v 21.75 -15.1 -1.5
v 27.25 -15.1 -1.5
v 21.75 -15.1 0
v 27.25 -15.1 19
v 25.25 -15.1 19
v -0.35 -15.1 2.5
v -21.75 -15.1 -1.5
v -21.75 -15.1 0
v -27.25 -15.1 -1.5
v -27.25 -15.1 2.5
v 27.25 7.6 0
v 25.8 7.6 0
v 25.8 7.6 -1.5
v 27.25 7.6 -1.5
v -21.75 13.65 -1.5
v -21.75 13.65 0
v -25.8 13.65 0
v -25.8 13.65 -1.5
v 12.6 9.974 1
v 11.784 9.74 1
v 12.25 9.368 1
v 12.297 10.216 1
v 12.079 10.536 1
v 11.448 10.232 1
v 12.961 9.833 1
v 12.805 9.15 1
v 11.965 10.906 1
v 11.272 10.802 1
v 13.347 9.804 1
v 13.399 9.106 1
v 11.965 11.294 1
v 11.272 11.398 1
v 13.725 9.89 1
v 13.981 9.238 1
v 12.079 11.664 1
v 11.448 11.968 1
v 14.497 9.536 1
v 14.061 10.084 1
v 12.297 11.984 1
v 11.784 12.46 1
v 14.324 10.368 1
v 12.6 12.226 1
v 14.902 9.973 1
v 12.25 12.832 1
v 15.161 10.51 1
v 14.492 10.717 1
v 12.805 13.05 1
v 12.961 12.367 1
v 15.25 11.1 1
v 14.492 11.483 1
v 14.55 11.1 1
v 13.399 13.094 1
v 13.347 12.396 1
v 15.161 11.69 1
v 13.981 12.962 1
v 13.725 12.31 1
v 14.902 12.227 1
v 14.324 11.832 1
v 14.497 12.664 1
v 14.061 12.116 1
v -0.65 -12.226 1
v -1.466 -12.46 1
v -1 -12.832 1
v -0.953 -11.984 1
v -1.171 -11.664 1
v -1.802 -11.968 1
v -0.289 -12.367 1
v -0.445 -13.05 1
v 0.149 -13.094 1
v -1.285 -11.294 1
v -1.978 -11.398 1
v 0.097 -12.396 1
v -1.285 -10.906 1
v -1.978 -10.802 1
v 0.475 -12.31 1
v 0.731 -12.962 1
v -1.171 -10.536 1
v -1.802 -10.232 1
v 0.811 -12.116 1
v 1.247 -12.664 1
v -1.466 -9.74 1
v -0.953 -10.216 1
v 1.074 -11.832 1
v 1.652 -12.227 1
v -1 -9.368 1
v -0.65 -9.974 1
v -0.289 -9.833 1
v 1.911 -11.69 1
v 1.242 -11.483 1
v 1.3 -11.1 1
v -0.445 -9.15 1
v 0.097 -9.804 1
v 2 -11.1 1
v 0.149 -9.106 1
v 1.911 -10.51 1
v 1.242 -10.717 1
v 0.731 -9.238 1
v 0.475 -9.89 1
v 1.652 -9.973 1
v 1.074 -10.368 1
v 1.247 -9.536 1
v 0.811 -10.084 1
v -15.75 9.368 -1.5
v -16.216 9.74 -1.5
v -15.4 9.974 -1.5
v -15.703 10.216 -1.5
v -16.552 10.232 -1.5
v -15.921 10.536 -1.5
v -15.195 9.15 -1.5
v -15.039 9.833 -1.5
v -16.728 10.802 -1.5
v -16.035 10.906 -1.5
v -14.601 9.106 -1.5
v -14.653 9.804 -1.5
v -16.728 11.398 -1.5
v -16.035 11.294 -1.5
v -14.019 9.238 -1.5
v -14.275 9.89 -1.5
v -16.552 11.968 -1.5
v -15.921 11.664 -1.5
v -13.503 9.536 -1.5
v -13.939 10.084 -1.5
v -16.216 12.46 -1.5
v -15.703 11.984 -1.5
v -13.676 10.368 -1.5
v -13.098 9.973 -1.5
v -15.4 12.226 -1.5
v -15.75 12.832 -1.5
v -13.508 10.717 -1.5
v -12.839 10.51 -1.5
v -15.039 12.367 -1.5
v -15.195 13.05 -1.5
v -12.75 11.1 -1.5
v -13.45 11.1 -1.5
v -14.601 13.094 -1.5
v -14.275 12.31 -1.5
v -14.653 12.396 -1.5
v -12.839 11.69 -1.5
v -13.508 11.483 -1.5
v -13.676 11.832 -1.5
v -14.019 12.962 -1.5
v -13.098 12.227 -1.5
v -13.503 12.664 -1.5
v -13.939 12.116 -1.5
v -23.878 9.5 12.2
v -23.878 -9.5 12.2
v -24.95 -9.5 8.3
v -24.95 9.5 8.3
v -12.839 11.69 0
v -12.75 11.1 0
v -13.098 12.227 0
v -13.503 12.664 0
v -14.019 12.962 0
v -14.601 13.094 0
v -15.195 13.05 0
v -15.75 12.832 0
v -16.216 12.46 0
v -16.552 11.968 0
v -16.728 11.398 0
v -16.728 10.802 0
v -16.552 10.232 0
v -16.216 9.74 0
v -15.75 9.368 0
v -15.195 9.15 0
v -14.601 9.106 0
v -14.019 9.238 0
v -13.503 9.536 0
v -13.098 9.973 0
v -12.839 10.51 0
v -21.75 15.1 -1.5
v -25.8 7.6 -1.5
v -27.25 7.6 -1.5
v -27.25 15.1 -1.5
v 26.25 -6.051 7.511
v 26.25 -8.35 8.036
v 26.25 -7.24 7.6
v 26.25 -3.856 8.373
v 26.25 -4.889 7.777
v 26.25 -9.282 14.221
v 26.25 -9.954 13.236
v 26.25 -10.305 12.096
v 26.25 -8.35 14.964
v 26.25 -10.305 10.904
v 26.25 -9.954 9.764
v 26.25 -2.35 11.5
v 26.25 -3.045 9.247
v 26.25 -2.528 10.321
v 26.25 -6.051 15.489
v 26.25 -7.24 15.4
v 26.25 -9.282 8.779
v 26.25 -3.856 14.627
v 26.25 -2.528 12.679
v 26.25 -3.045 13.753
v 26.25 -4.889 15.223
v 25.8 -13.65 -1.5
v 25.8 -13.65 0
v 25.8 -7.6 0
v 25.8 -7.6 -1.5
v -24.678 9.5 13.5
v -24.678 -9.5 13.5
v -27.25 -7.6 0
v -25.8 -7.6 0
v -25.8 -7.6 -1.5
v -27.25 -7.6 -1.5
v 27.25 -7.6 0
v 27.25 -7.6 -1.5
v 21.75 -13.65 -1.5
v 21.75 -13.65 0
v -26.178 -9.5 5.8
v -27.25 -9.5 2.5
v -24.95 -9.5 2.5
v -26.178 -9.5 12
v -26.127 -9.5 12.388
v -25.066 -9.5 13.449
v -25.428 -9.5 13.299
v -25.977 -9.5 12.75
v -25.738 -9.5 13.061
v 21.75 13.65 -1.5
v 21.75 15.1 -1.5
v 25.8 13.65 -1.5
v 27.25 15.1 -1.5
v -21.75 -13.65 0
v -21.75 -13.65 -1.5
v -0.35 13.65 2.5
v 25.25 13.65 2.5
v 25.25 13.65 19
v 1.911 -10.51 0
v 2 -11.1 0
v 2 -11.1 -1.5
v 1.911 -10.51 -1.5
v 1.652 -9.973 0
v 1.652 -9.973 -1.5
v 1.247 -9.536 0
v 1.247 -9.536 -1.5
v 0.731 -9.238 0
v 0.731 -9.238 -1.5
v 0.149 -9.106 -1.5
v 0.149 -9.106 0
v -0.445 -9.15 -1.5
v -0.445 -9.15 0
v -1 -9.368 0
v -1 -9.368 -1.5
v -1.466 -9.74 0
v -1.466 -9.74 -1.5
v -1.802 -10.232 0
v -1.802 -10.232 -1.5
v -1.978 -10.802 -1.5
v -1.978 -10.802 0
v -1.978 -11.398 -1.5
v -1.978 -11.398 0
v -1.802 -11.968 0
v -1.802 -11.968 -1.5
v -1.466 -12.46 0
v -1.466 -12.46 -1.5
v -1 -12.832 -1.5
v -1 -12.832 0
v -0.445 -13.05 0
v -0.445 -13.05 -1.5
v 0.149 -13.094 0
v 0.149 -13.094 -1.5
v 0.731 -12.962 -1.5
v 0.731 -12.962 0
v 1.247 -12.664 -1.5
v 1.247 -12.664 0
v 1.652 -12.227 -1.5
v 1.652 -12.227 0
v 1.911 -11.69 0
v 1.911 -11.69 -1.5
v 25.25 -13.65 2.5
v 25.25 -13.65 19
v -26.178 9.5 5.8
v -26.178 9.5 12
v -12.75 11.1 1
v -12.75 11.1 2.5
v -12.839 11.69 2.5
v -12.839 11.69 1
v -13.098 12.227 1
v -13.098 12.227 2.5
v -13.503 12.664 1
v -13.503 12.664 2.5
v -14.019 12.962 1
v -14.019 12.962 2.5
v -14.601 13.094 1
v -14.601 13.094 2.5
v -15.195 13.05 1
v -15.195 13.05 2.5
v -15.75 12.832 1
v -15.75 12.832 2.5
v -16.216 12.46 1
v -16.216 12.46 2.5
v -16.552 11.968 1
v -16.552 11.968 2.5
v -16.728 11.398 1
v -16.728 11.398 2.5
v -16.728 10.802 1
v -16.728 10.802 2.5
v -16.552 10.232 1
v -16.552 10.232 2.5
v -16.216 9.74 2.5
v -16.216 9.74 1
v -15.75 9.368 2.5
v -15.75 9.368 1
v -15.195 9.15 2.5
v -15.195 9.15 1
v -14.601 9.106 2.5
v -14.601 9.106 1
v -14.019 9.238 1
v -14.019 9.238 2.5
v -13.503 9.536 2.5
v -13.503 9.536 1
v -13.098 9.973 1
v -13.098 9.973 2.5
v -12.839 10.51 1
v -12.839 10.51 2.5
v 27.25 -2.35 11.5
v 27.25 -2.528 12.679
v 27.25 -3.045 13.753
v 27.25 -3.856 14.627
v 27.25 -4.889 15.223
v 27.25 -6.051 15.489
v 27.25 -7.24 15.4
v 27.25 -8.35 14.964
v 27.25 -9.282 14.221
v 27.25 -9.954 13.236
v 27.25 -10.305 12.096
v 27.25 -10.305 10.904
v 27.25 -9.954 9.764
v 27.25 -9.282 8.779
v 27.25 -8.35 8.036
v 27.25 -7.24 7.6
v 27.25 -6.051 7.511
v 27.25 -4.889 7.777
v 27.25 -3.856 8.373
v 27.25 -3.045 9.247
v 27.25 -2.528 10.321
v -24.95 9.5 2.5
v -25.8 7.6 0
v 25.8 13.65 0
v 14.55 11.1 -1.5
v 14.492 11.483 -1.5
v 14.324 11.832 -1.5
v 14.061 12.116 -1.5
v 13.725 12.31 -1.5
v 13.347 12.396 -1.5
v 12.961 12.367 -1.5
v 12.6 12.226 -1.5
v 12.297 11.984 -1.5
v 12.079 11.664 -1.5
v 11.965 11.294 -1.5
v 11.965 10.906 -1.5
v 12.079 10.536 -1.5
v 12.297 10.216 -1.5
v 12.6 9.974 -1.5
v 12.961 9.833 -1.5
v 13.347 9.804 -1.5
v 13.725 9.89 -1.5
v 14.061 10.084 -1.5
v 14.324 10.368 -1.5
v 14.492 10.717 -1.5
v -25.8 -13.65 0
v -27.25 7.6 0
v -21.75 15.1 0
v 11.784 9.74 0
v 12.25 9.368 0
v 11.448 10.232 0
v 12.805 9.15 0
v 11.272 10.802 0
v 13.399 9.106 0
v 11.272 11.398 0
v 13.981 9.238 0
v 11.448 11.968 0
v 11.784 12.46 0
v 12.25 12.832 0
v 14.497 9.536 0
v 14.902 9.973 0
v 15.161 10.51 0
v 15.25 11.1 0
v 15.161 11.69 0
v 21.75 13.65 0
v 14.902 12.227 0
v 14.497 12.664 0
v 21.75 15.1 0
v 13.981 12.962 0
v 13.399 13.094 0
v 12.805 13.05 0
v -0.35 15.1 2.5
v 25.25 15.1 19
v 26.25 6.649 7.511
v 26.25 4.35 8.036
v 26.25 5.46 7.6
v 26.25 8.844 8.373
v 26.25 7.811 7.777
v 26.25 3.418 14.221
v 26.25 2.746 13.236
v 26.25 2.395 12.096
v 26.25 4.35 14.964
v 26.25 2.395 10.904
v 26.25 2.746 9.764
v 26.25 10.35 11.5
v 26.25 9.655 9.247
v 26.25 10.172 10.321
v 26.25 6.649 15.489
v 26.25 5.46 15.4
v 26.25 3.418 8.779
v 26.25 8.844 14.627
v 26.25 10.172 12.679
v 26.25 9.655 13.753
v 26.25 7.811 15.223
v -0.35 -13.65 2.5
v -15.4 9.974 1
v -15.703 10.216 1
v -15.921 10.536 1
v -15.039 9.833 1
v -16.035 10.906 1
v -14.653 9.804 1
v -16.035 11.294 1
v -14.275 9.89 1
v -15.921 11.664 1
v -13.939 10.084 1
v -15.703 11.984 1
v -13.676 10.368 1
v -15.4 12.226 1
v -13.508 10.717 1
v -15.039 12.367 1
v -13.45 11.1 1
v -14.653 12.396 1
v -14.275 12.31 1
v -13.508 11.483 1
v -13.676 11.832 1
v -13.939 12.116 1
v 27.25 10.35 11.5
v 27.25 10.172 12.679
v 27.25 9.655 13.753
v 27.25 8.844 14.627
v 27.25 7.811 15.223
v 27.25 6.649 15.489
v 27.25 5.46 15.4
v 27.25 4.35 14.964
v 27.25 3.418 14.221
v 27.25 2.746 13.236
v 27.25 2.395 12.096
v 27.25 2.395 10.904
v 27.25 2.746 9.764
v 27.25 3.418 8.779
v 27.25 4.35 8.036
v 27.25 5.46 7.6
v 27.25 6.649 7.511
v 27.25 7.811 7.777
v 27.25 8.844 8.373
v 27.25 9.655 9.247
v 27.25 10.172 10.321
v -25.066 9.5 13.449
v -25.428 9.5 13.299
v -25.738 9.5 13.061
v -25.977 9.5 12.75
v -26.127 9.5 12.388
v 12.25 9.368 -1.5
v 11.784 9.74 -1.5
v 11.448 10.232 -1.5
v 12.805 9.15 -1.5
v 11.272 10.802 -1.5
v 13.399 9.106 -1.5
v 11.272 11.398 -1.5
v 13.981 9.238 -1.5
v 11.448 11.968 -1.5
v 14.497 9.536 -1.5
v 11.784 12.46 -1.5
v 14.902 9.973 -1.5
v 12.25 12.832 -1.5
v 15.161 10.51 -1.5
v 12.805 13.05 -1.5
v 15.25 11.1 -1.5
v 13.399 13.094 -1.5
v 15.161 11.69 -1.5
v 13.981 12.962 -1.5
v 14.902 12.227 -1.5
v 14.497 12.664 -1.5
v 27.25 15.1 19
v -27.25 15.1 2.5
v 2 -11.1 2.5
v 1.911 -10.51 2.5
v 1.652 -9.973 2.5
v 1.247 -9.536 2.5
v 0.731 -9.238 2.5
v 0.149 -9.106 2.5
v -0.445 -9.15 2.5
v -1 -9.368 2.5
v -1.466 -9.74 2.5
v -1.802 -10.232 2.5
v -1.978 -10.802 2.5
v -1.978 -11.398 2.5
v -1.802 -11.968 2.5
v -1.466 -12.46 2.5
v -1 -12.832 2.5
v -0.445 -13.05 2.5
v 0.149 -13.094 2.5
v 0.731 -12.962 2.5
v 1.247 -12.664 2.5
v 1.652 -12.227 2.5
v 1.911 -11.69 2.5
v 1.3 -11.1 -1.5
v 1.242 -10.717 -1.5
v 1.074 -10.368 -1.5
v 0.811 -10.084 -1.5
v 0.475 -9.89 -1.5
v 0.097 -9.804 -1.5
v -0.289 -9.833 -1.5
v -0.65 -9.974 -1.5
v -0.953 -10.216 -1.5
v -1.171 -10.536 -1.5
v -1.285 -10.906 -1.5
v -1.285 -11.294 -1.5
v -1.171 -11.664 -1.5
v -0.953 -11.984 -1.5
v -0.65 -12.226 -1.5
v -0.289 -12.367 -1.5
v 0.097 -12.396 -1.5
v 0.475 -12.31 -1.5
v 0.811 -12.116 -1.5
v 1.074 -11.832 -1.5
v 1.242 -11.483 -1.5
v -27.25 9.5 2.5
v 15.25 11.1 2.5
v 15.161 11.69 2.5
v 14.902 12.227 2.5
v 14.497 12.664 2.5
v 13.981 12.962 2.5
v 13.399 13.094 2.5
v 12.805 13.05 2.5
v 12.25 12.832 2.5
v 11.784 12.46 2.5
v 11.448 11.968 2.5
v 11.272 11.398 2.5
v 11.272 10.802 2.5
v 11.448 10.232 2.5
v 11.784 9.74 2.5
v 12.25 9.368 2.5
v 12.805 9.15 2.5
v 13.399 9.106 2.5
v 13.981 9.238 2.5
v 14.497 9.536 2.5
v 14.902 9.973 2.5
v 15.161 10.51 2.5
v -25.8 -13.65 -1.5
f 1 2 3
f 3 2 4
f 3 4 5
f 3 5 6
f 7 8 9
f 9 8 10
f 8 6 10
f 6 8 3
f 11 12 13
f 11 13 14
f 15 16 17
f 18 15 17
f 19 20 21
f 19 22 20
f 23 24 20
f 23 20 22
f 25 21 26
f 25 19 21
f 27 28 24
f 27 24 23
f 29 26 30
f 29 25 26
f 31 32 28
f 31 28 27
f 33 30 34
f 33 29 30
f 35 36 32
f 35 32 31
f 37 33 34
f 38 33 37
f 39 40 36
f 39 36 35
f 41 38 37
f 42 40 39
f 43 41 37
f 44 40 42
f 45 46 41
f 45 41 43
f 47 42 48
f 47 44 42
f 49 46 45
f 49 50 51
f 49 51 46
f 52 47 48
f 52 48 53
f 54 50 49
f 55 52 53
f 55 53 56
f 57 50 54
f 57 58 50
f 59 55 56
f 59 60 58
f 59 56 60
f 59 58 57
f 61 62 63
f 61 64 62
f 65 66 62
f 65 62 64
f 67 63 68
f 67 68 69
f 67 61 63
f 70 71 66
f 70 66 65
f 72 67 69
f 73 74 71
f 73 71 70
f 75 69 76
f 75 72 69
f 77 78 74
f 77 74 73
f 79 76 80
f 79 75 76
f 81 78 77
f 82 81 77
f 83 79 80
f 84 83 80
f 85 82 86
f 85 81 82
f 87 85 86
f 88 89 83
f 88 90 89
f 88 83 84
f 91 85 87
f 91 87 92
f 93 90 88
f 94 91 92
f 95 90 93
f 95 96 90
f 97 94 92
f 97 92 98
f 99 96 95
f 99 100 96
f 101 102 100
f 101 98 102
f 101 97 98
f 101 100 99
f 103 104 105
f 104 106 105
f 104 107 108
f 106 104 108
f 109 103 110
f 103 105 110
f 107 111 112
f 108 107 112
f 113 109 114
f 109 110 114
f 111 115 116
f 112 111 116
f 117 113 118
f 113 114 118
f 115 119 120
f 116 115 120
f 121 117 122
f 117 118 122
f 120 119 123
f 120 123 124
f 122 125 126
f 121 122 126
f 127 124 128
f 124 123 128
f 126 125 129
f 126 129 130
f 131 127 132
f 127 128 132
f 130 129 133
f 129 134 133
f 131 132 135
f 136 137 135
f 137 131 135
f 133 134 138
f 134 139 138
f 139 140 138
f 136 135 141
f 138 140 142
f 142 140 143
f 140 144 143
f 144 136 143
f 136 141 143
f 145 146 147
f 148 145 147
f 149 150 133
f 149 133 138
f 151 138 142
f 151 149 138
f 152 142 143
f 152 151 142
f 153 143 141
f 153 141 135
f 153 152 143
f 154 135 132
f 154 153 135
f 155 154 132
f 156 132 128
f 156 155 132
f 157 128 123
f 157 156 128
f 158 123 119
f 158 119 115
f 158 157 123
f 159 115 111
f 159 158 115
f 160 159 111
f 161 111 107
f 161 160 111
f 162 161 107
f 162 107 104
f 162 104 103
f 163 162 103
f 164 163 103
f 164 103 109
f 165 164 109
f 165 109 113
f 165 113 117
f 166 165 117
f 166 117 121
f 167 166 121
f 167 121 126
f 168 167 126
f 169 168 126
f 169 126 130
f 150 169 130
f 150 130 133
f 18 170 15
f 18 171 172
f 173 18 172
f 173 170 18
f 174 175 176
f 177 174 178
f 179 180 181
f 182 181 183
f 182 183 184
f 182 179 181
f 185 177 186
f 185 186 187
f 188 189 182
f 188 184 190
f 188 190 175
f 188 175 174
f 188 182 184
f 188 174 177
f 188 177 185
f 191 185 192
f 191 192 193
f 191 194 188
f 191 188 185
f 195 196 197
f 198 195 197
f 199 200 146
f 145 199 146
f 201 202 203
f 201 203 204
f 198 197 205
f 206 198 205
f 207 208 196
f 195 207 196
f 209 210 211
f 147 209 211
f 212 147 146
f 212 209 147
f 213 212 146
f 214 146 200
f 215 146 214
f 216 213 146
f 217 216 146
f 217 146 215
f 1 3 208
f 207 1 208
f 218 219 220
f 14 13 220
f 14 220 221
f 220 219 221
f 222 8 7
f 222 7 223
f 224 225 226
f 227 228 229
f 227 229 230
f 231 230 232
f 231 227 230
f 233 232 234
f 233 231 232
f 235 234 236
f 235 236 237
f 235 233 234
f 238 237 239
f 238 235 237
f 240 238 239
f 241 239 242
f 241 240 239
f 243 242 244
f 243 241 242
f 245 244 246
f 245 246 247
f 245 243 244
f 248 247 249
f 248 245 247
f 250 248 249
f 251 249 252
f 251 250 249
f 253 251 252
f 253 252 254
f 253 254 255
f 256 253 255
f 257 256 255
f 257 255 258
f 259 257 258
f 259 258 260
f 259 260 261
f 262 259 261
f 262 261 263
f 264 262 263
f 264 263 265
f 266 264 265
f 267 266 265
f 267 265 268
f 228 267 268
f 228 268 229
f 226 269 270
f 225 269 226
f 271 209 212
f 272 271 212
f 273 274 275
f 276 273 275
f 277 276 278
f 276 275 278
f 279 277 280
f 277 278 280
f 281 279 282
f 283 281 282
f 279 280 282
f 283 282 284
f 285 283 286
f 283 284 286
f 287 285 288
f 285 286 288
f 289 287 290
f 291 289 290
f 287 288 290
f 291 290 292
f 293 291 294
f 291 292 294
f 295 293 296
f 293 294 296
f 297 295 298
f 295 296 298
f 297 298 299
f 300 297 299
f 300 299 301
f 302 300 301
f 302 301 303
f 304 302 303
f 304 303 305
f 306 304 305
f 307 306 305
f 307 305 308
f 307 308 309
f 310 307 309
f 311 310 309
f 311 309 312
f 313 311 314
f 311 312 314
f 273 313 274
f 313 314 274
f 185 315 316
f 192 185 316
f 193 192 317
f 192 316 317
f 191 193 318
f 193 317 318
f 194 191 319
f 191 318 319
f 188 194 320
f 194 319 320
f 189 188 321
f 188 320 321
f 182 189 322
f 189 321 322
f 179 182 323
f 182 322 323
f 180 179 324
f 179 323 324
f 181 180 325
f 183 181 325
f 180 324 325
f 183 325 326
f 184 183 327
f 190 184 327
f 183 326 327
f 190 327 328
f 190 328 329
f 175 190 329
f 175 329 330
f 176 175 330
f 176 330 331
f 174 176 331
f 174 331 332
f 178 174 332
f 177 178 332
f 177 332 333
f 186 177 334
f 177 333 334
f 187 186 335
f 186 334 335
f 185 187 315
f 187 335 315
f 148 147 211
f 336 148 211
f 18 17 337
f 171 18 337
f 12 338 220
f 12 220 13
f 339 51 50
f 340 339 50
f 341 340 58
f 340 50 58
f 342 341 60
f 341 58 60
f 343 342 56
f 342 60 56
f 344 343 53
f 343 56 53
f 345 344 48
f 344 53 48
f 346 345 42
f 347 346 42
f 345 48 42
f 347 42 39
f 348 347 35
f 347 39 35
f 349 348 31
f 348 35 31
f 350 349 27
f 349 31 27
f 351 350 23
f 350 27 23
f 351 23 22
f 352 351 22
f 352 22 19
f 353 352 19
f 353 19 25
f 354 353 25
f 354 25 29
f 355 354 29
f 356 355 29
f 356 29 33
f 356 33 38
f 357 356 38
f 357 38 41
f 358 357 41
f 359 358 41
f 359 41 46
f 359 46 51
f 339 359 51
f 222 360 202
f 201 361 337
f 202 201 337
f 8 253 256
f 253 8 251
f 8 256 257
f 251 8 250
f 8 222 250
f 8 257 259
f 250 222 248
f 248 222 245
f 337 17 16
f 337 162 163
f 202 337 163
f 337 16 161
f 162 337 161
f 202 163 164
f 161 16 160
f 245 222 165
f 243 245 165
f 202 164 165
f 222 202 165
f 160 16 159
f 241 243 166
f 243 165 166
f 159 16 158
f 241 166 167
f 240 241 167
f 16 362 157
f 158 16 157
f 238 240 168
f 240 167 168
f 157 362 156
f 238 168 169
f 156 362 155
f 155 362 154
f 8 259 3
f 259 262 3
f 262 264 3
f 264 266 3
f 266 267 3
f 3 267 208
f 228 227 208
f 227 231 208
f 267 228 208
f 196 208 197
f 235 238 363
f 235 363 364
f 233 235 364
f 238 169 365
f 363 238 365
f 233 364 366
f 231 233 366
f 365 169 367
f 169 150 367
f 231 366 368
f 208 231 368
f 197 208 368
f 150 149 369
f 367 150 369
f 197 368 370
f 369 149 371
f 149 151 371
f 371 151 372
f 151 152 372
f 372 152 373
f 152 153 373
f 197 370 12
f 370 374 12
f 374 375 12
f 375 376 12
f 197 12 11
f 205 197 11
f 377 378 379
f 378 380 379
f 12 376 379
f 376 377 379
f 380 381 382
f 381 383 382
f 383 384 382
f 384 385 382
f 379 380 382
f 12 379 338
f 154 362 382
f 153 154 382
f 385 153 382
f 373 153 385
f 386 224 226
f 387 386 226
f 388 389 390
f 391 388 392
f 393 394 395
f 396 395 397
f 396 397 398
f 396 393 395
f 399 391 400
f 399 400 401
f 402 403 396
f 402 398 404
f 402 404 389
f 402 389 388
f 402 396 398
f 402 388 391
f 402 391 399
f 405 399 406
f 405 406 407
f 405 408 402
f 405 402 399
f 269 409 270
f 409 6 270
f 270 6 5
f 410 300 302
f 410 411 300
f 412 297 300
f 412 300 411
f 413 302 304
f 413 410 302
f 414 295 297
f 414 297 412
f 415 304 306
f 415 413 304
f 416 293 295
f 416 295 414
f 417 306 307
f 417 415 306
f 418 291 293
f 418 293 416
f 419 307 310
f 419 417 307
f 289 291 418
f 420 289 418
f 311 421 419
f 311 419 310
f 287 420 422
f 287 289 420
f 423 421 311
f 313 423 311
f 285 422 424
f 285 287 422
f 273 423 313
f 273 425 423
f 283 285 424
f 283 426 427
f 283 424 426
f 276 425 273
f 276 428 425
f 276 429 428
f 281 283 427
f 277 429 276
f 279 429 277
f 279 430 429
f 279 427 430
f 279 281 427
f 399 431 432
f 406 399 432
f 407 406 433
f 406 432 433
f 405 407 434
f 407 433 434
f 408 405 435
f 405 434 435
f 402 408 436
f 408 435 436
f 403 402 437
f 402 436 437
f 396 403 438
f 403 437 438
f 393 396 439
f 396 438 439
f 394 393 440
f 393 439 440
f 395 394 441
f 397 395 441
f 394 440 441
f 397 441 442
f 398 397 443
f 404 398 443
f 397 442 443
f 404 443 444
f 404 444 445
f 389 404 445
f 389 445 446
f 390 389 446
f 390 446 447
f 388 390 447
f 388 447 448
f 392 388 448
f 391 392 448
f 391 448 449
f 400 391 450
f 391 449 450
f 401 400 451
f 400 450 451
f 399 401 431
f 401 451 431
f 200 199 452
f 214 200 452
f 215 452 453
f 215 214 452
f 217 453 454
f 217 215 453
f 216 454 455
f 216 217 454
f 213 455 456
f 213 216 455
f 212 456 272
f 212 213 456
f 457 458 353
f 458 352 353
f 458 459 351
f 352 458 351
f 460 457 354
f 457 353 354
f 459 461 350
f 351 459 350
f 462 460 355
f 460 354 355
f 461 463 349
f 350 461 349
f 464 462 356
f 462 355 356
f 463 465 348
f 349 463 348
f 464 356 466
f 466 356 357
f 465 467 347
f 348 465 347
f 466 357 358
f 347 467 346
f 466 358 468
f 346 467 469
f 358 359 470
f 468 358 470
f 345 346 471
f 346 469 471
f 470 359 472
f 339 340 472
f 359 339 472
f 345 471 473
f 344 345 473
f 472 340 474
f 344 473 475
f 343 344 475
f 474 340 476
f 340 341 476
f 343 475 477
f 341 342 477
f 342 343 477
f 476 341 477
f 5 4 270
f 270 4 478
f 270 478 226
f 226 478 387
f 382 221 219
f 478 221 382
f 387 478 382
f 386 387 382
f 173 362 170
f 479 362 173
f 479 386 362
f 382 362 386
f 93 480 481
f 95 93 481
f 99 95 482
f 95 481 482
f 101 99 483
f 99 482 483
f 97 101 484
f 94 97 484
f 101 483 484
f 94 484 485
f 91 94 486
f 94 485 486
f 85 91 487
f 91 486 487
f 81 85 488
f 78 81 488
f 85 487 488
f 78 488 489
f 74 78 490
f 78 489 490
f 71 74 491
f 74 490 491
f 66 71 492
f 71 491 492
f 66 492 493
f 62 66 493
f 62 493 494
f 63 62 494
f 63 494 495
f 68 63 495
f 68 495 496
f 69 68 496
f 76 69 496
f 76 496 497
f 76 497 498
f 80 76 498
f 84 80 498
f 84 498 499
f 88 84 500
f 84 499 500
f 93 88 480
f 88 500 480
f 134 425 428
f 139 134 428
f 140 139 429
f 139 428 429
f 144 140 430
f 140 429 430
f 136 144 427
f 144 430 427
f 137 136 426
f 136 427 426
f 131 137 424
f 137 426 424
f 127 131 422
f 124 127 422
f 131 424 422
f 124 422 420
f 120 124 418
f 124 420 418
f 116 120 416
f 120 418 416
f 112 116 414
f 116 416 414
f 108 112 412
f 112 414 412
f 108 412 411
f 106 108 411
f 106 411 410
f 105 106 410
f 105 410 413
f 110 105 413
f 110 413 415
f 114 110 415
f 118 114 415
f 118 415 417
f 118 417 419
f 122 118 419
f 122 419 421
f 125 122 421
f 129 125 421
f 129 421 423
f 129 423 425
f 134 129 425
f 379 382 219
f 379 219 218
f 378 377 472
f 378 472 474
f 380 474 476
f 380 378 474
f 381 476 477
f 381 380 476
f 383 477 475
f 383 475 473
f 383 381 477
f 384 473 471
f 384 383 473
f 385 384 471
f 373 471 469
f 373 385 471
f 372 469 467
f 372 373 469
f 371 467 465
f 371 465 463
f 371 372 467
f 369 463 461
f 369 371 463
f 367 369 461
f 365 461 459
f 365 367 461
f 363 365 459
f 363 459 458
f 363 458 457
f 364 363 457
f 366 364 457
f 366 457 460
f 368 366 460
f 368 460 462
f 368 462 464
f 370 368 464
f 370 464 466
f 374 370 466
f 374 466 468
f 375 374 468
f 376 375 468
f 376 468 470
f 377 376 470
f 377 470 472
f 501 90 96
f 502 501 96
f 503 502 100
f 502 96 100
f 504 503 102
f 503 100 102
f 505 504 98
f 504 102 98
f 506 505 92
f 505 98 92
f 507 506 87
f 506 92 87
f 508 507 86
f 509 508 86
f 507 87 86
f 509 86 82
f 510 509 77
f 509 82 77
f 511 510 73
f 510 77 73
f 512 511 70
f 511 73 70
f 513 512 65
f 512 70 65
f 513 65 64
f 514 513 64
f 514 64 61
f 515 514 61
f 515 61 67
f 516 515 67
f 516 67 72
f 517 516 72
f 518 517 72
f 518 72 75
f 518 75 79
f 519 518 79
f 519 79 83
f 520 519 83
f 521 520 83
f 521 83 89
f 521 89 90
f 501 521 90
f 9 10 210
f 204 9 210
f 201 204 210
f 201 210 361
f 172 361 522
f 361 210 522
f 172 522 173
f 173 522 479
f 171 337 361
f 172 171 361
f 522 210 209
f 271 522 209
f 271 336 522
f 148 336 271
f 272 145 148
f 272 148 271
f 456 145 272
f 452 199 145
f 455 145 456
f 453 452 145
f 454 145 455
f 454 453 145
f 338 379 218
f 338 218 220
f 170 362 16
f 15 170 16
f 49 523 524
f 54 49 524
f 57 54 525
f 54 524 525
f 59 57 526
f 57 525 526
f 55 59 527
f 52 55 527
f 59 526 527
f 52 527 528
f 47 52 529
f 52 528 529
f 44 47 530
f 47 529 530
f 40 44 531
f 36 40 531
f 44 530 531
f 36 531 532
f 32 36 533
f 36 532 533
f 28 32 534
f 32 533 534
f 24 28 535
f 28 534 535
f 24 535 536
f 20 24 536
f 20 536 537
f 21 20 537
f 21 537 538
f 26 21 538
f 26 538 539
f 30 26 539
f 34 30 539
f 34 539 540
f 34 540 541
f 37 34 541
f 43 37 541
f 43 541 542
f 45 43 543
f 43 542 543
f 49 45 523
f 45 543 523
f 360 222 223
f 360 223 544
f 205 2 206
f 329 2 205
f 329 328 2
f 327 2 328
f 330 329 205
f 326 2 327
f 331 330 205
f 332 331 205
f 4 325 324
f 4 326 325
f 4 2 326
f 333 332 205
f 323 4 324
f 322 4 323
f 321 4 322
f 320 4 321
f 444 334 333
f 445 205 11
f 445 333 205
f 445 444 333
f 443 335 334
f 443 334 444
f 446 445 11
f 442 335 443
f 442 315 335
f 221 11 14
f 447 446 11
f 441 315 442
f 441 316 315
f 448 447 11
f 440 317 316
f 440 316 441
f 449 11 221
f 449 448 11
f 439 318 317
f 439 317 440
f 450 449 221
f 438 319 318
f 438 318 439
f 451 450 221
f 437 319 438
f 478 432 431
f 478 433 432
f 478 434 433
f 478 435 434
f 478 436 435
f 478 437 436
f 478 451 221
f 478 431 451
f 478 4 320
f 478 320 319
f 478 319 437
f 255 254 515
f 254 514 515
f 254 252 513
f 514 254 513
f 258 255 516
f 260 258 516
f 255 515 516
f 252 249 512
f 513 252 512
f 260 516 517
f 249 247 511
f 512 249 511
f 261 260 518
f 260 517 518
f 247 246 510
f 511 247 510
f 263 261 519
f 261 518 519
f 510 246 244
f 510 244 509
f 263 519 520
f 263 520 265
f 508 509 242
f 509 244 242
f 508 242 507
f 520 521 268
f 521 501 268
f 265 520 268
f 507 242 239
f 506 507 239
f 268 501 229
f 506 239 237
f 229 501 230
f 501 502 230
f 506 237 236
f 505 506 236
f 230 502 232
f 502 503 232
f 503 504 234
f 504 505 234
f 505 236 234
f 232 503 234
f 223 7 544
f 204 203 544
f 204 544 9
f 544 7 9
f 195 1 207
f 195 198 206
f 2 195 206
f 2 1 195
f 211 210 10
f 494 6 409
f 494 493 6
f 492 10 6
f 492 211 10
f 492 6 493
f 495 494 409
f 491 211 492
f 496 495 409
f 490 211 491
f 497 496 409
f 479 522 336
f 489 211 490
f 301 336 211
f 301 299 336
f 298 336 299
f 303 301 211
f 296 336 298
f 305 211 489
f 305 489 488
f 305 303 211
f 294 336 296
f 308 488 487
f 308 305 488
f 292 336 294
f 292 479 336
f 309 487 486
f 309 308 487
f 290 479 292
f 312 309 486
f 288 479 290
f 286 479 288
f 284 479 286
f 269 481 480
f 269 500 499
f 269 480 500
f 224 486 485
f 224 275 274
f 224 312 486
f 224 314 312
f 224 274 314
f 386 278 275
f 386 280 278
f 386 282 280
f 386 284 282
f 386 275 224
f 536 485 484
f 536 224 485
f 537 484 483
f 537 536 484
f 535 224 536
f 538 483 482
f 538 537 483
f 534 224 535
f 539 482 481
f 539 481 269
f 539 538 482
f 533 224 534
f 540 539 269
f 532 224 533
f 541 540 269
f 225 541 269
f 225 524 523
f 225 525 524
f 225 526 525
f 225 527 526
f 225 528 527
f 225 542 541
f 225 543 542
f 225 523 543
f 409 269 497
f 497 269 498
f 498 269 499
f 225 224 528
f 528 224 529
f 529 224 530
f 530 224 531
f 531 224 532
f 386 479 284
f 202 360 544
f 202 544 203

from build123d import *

# Parameters (mm, degrees)
SKETCH_W                = 54.5
SKETCH_H                = 30.2
PAD_DEPTH               = 2.5
PAD001_DEPTH            = 16.5
POCKET_DEPTH            = 30.201
PAD002_DEPTH            = 24.6
SKETCH004_W             = 5.6
SKETCH004_H             = 11
POCKET001_DEPTH         = 5
SKETCH005_R             = 2
PAD003_DEPTH            = 4
SKETCH006_R             = 2
POCKET002_DEPTH         = 1.5
SKETCH007_R             = 1.3
POCKET003_DEPTH         = 4.001
PAD004_DEPTH            = 1.5
PAD004_MIRRORED_2_DEPTH = 1.5
SKETCH012_R             = 4
POCKET006_DEPTH         = 1


with BuildPart() as part:
    # Sketch → Pad (new body)
    with BuildSketch(Plane.XY):
        Rectangle(SKETCH_W, SKETCH_H)
    extrude(amount=PAD_DEPTH)

    # Sketch001 (on Face6 of Pad) → Pad001 (join)
    with BuildSketch(Plane.XY.offset(2.5)):
        Polygon((27.25, 15.1), (27.25, -15.1), (-0.35, -15.1), (-0.35, -13.65), (25.25, -13.65), (25.25, 13.65), (-0.35, 13.65), (-0.35, 15.1), align=None)
    extrude(amount=PAD001_DEPTH)

    # Sketch002 (on Face15 of Pad001) → Pocket (cut, through all)
    with BuildSketch(Plane.XZ.offset(15.1)):
        Polygon((-0.35, 2.5), (25.25, 19), (27.25, 19), (27.25, 21), (-0.35, 21), align=None)
    extrude(amount=-POCKET_DEPTH, mode=Mode.SUBTRACT)

    # Sketch003 (on Face7 of Pocket) → Pad002 (join)
    with BuildSketch(Plane.XZ.offset(15.1)):
        with BuildLine():
            Line((-27.25, 2.5), (-26.177765, 5.8))
            Line((-26.177765, 5.8), (-26.177765, 12))
            ThreePointArc((-24.677765, 13.5), (-25.738425, 13.06066), (-26.177765, 12))
            Line((-24.677765, 13.5), (-23.877765, 12.2))
            Line((-23.877765, 12.2), (-24.95, 8.3))
            Line((-24.95, 8.3), (-24.95, 2.5))
            Line((-24.95, 2.5), (-27.25, 2.5))
        make_face()
    extrude(amount=-PAD002_DEPTH)

    # Sketch004 (on Face2 of Pad002) → Pocket001 (cut)
    with BuildSketch(Plane(origin=(-27.25, 0, 0), x_dir=(0, -1, 0), z_dir=(-1, 0, 0))):
        with Locations((12.3, 8)):
            Rectangle(SKETCH004_W, SKETCH004_H)
    extrude(amount=-POCKET001_DEPTH, mode=Mode.SUBTRACT)

    # Sketch005 (on Face5 of Pocket001) → Pad003 (join)
    with BuildSketch(Plane.XY.offset(2.5)):
        with Locations((-14.75, 11.1)):
            Circle(SKETCH005_R)
        with Locations((13.25, 11.1)):
            Circle(SKETCH005_R)
        with Locations((0, -11.1)):
            Circle(SKETCH005_R)
    extrude(amount=-PAD003_DEPTH)

    # Sketch006 (on Face5 of Pad003) → Pocket002 (cut)
    with BuildSketch(Plane.XY.offset(2.5)):
        with Locations((-14.75, 11.1)):
            Circle(SKETCH006_R)
        with Locations((13.25, 11.1)):
            Circle(SKETCH006_R)
        with Locations((0, -11.1)):
            Circle(SKETCH006_R)
    extrude(amount=-POCKET002_DEPTH, mode=Mode.SUBTRACT)

    # Sketch007 (on Face5 of Pocket002) → Pocket003 (cut, through all)
    with BuildSketch(Plane.XY.offset(2.5)):
        with Locations((-14.75, 11.1)):
            Circle(SKETCH007_R)
        with Locations((13.25, 11.1)):
            Circle(SKETCH007_R)
        with Locations((0, -11.1)):
            Circle(SKETCH007_R)
    extrude(amount=-POCKET003_DEPTH, mode=Mode.SUBTRACT)

    # Sketch008 (on Face4 of Pocket003) → Pad004 (join)
    with BuildSketch(Plane(origin=(0, 0, 0), x_dir=(1, 0, 0), z_dir=(0, 0, -1))):
        Polygon((-27.25, 15.1), (-21.75, 15.1), (-21.75, 13.65), (-25.8, 13.65), (-25.8, 7.6), (-27.25, 7.6), align=None)
    pad004 = extrude(amount=PAD004_DEPTH)

    # Sketch008 Mirrored 2 → Pad004 Mirrored 2 (add)
    with BuildSketch(Plane(origin=(0, 0, 0), x_dir=(-1, 0, 0), z_dir=(0, 0, 1))):
        Polygon((-27.25, 15.1), (-21.75, 15.1), (-21.75, 13.65), (-25.8, 13.65), (-25.8, 7.6), (-27.25, 7.6), align=None)
    pad004_mirrored_2 = extrude(amount=-PAD004_MIRRORED_2_DEPTH)

    # Mirrored001: Pad004, Pad004 Mirrored 2 across Sketch008 H_Axis
    add(pad004.mirror(Plane(origin=(0, 0, 0), x_dir=(0, 0, -1), z_dir=(0, -1, 0))))
    add(pad004_mirrored_2.mirror(Plane(origin=(0, 0, 0), x_dir=(0, 0, -1), z_dir=(0, -1, 0))))

    # Sketch012 (on Face16 of MultiTransform) → Pocket006 (cut)
    with BuildSketch(Plane.YZ.offset(27.25)):
        with Locations((-6.35, 11.5)):
            Circle(SKETCH012_R)
        with Locations((6.35, 11.5)):
            Circle(SKETCH012_R)
    extrude(amount=-POCKET006_DEPTH, mode=Mode.SUBTRACT)


solid = part.part
